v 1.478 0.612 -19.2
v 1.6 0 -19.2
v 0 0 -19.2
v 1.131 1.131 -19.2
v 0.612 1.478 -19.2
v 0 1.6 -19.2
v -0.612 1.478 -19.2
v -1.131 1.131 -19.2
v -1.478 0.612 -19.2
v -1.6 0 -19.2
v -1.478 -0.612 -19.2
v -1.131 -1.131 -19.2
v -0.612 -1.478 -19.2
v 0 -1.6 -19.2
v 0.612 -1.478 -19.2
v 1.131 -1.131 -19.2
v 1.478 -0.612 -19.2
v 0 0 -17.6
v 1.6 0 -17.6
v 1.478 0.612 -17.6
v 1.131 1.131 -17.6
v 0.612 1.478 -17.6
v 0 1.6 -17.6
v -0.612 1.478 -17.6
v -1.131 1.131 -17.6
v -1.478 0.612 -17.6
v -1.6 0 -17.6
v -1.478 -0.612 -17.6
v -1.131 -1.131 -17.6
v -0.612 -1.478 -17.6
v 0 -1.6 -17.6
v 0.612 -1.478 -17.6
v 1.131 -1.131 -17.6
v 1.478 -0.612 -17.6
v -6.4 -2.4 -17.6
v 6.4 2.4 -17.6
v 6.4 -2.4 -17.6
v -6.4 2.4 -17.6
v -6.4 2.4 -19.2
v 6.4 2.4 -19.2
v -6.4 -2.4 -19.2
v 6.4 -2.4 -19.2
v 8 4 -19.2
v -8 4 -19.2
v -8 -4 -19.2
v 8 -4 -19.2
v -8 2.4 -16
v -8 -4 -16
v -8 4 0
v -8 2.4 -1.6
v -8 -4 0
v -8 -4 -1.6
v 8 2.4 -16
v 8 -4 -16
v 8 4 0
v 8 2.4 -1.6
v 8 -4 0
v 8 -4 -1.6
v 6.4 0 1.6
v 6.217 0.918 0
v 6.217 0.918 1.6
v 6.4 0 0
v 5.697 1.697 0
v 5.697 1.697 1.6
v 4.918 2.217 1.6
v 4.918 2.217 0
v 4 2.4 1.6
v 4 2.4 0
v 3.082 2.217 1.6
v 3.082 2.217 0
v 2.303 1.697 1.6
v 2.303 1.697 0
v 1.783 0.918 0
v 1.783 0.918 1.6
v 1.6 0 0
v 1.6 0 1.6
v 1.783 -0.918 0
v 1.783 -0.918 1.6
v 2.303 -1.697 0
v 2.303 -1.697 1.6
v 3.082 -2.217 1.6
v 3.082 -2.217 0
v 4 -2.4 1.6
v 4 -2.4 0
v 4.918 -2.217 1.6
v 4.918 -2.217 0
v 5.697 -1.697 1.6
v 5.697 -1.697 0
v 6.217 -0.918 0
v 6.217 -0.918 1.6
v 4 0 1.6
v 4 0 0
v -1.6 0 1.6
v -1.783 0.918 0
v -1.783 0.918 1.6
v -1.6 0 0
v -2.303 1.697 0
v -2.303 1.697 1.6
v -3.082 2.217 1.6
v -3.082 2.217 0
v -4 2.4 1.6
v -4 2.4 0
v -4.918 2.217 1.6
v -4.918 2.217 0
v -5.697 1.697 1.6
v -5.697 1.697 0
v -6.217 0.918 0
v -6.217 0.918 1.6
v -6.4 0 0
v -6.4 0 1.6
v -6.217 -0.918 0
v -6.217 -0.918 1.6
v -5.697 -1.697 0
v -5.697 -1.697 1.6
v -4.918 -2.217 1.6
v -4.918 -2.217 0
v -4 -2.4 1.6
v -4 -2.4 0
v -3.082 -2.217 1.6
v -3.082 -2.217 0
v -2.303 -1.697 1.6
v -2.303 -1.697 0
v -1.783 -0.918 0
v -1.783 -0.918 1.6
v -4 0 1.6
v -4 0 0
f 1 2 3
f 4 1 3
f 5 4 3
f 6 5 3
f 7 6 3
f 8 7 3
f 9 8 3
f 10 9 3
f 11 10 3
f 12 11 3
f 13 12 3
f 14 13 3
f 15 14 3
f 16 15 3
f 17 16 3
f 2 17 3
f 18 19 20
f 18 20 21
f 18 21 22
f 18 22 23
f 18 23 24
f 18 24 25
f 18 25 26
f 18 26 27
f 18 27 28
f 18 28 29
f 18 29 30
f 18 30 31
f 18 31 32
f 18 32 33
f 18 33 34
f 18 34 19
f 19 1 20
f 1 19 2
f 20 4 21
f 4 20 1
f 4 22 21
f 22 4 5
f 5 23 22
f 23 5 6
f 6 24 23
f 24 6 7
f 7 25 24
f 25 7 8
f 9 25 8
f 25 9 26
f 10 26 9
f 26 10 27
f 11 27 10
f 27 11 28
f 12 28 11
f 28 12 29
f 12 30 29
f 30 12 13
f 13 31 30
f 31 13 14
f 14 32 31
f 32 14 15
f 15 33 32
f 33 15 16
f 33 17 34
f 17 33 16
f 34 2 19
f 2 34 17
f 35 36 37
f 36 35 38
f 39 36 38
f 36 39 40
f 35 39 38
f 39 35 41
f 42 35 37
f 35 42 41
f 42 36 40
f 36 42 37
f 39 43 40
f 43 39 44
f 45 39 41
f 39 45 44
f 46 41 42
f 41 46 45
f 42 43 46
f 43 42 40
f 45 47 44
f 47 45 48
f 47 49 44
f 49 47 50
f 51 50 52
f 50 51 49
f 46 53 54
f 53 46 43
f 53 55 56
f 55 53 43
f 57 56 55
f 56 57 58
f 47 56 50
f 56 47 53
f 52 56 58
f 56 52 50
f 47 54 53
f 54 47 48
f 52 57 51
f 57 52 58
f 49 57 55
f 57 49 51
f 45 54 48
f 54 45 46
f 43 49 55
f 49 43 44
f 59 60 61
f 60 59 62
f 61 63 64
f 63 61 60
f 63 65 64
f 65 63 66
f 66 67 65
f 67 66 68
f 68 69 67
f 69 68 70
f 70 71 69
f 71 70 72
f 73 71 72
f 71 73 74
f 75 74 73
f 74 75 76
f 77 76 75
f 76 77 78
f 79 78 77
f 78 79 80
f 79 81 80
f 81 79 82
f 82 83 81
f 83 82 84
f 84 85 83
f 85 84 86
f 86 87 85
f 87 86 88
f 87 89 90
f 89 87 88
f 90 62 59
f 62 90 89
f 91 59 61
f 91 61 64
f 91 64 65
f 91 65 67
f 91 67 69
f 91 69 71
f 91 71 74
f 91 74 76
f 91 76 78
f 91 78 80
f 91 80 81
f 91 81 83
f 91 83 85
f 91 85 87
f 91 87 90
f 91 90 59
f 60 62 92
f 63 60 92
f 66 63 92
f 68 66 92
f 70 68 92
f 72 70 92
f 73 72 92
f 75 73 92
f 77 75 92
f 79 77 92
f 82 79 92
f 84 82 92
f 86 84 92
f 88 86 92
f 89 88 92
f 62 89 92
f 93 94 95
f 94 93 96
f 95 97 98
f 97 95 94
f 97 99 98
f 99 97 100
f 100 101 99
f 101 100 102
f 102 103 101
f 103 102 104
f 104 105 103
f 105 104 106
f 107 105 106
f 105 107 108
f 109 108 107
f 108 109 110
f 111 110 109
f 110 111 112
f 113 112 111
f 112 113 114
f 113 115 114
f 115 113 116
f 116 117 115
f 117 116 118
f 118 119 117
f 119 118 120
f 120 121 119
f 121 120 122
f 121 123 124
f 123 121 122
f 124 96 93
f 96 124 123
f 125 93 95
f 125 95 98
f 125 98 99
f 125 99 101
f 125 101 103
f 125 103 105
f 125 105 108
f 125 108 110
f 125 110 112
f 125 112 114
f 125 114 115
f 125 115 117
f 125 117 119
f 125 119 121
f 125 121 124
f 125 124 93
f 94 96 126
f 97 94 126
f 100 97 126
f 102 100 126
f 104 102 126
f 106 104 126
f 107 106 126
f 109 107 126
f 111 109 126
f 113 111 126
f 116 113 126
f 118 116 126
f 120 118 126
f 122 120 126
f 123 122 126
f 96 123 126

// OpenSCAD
// file: ../p/4-4edge.scad
use <../lib.scad>
function ldraw_lib__4_4edge() = [
// 0 Circle 1.0
// 0 Name: 4-4edge.dat
// 0 Author: James Jessiman
// 0 !LDRAW_ORG Primitive UPDATE 2017-01
// 0 !LICENSE Licensed under CC BY 2.0 and CC BY 4.0 : see CAreadme.txt
// 
// 0 BFC CERTIFY CCW
  [0,"BFC","CERTIFY"],
  [0,"BFC","CCW"],
// 
// 0 !HISTORY 1998-12-15 [PTadmin] Official Update 1998-10
// 0 !HISTORY 2005-12-28 [PTadmin] Official Update 2005-01
// 0 !HISTORY 2007-06-24 [PTadmin] Header formatted for Contributor Agreement
// 0 !HISTORY 2008-07-01 [PTadmin] Official Update 2008-01
// 0 !HISTORY 2017-01-15 [Steffen] BFCed
// 0 !HISTORY 2017-12-30 [PTadmin] Official Update 2017-01
// 
// 
// 2 24 1 0 0 0.9239 0 0.3827
  [2,24,1,0,0,0.9239,0,0.3827],
// 2 24 0.9239 0 0.3827 0.7071 0 0.7071
  [2,24,0.9239,0,0.3827,0.7071,0,0.7071],
// 2 24 0.7071 0 0.7071 0.3827 0 0.9239
  [2,24,0.7071,0,0.7071,0.3827,0,0.9239],
// 2 24 0.3827 0 0.9239 0 0 1
  [2,24,0.3827,0,0.9239,0,0,1],
// 2 24 0 0 1 -0.3827 0 0.9239
  [2,24,0,0,1,-0.3827,0,0.9239],
// 2 24 -0.3827 0 0.9239 -0.7071 0 0.7071
  [2,24,-0.3827,0,0.9239,-0.7071,0,0.7071],
// 2 24 -0.7071 0 0.7071 -0.9239 0 0.3827
  [2,24,-0.7071,0,0.7071,-0.9239,0,0.3827],
// 2 24 -0.9239 0 0.3827 -1 0 -0
  [2,24,-0.9239,0,0.3827,-1,0,-0],
// 2 24 -1 0 -0 -0.9239 0 -0.3827
  [2,24,-1,0,-0,-0.9239,0,-0.3827],
// 2 24 -0.9239 0 -0.3827 -0.7071 0 -0.7071
  [2,24,-0.9239,0,-0.3827,-0.7071,0,-0.7071],
// 2 24 -0.7071 0 -0.7071 -0.3827 0 -0.9239
  [2,24,-0.7071,0,-0.7071,-0.3827,0,-0.9239],
// 2 24 -0.3827 0 -0.9239 0 0 -1
  [2,24,-0.3827,0,-0.9239,0,0,-1],
// 2 24 0 0 -1 0.3827 0 -0.9239
  [2,24,0,0,-1,0.3827,0,-0.9239],
// 2 24 0.3827 0 -0.9239 0.7071 0 -0.7071
  [2,24,0.3827,0,-0.9239,0.7071,0,-0.7071],
// 2 24 0.7071 0 -0.7071 0.9239 0 -0.3827
  [2,24,0.7071,0,-0.7071,0.9239,0,-0.3827],
// 2 24 0.9239 0 -0.3827 1 0 0
  [2,24,0.9239,0,-0.3827,1,0,0],
];
module ldraw_lib__4_4edge(step=0, col=false, unit=2/5, alt=false, line=0.2, solid=!$preview)
    makepoly(ldraw_lib__4_4edge(), step=step, col=col, unit=unit, alt=alt, line=line, solid=solid);
ldraw_lib__4_4edge(line=0.2);
// file: ../p/4-4disc.scad
use <../lib.scad>
function ldraw_lib__4_4disc() = [
// 0 Disc 1.0
// 0 Name: 4-4disc.dat
// 0 Author: James Jessiman
// 0 !LDRAW_ORG Primitive UPDATE 2002-02
// 0 !LICENSE Licensed under CC BY 2.0 and CC BY 4.0 : see CAreadme.txt
// 
// 0 BFC CERTIFY CCW
  [0,"BFC","CERTIFY"],
  [0,"BFC","CCW"],
// 
// 0 !HISTORY 1998-12-15 [PTadmin] Official Update 1998-10
// 0 !HISTORY 2002-03-23 [sbliss] Added BFC statement
// 0 !HISTORY 2002-04-25 [PTadmin] Official Update 2002-02
// 0 !HISTORY 2007-06-24 [PTadmin] Header formatted for Contributor Agreement
// 0 !HISTORY 2008-07-01 [PTadmin] Official Update 2008-01
// 
// 
// 3 16 0 0 0 1 0 0 0.9239 0 0.3827
  [3,16,0,0,0,1,0,0,0.9239,0,0.3827],
// 3 16 0 0 0 0.9239 0 0.3827 0.7071 0 0.7071
  [3,16,0,0,0,0.9239,0,0.3827,0.7071,0,0.7071],
// 3 16 0 0 0 0.7071 0 0.7071 0.3827 0 0.9239
  [3,16,0,0,0,0.7071,0,0.7071,0.3827,0,0.9239],
// 3 16 0 0 0 0.3827 0 0.9239 0 0 1
  [3,16,0,0,0,0.3827,0,0.9239,0,0,1],
// 3 16 0 0 0 0 0 1 -0.3827 0 0.9239
  [3,16,0,0,0,0,0,1,-0.3827,0,0.9239],
// 3 16 0 0 0 -0.3827 0 0.9239 -0.7071 0 0.7071
  [3,16,0,0,0,-0.3827,0,0.9239,-0.7071,0,0.7071],
// 3 16 0 0 0 -0.7071 0 0.7071 -0.9239 0 0.3827
  [3,16,0,0,0,-0.7071,0,0.7071,-0.9239,0,0.3827],
// 3 16 0 0 0 -0.9239 0 0.3827 -1 0 -0
  [3,16,0,0,0,-0.9239,0,0.3827,-1,0,-0],
// 3 16 0 0 0 -1 0 -0 -0.9239 0 -0.3827
  [3,16,0,0,0,-1,0,-0,-0.9239,0,-0.3827],
// 3 16 0 0 0 -0.9239 0 -0.3827 -0.7071 0 -0.7071
  [3,16,0,0,0,-0.9239,0,-0.3827,-0.7071,0,-0.7071],
// 3 16 0 0 0 -0.7071 0 -0.7071 -0.3827 0 -0.9239
  [3,16,0,0,0,-0.7071,0,-0.7071,-0.3827,0,-0.9239],
// 3 16 0 0 0 -0.3827 0 -0.9239 0 0 -1
  [3,16,0,0,0,-0.3827,0,-0.9239,0,0,-1],
// 3 16 0 0 0 0 0 -1 0.3827 0 -0.9239
  [3,16,0,0,0,0,0,-1,0.3827,0,-0.9239],
// 3 16 0 0 0 0.3827 0 -0.9239 0.7071 0 -0.7071
  [3,16,0,0,0,0.3827,0,-0.9239,0.7071,0,-0.7071],
// 3 16 0 0 0 0.7071 0 -0.7071 0.9239 0 -0.3827
  [3,16,0,0,0,0.7071,0,-0.7071,0.9239,0,-0.3827],
// 3 16 0 0 0 0.9239 0 -0.3827 1 0 0
  [3,16,0,0,0,0.9239,0,-0.3827,1,0,0],
// 0
];
module ldraw_lib__4_4disc(step=0, col=false, unit=2/5, alt=false, line=0.2, solid=!$preview)
    makepoly(ldraw_lib__4_4disc(), step=step, col=col, unit=unit, alt=alt, line=line, solid=solid);
ldraw_lib__4_4disc(line=0.2);
// file: ../p/4-4cyli.scad
use <../lib.scad>
$fa=1; $fs=0.2;
function ldraw_lib__4_4cyli(realsolid=false) = [
// 0 Cylinder 1.0
// 0 Name: 4-4cyli.dat
// 0 Author: James Jessiman
// 0 !LDRAW_ORG Primitive UPDATE 2005-01
// 0 !LICENSE Licensed under CC BY 2.0 and CC BY 4.0 : see CAreadme.txt
// 
// 0 BFC CERTIFY CCW
  [0,"BFC","CERTIFY"],
  [0,"BFC","CCW"],
// 
// 0 !HISTORY 1998-12-15 [PTadmin] Official Update 1998-10
// 0 !HISTORY 2002-03-23 [sbliss] Added BFC statement; merged headers from files in distributions LDraw 0.27 and Complete.
// 0 !HISTORY 2002-04-25 [PTadmin] Official Update 2002-02
// 0 !HISTORY 2004-12-14 [guyvivan] BFC CCW
// 0 !HISTORY 2005-12-28 [PTadmin] Official Update 2005-01
// 0 !HISTORY 2007-06-24 [PTadmin] Header formatted for Contributor Agreement
// 0 !HISTORY 2008-07-01 [PTadmin] Official Update 2008-01
// 
// 
// 4 16 1 1 0 0.9239 1 0.3827 0.9239 0 0.3827 1 0 0
  [4,16,1,1,0,0.9239,1,0.3827,0.9239,0,0.3827,1,0,0],
// 5 24 1 0 0 1 1 0 0.9239 0 0.3827 0.9239 0 -0.3827
  [5,24,1,0,0,1,1,0,0.9239,0,0.3827,0.9239,0,-0.3827],
// 4 16 0.9239 1 0.3827 0.7071 1 0.7071 0.7071 0 0.7071 0.9239 0 0.3827
  [4,16,0.9239,1,0.3827,0.7071,1,0.7071,0.7071,0,0.7071,0.9239,0,0.3827],
// 5 24 0.9239 0 0.3827 0.9239 1 0.3827 0.7071 0 0.7071 1 0 0
  [5,24,0.9239,0,0.3827,0.9239,1,0.3827,0.7071,0,0.7071,1,0,0],
// 4 16 0.7071 1 0.7071 0.3827 1 0.9239 0.3827 0 0.9239 0.7071 0 0.7071
  [4,16,0.7071,1,0.7071,0.3827,1,0.9239,0.3827,0,0.9239,0.7071,0,0.7071],
// 5 24 0.7071 0 0.7071 0.7071 1 0.7071 0.3827 0 0.9239 0.9239 0 0.3827
  [5,24,0.7071,0,0.7071,0.7071,1,0.7071,0.3827,0,0.9239,0.9239,0,0.3827],
// 4 16 0.3827 1 0.9239 0 1 1 0 0 1 0.3827 0 0.9239
  [4,16,0.3827,1,0.9239,0,1,1,0,0,1,0.3827,0,0.9239],
// 5 24 0.3827 0 0.9239 0.3827 1 0.9239 0 0 1 0.7071 0 0.7071
  [5,24,0.3827,0,0.9239,0.3827,1,0.9239,0,0,1,0.7071,0,0.7071],
// 4 16 0 1 1 -0.3827 1 0.9239 -0.3827 0 0.9239 0 0 1
  [4,16,0,1,1,-0.3827,1,0.9239,-0.3827,0,0.9239,0,0,1],
// 5 24 0 0 1 0 1 1 -0.3827 0 0.9239 0.3827 0 0.9239
  [5,24,0,0,1,0,1,1,-0.3827,0,0.9239,0.3827,0,0.9239],
// 4 16 -0.3827 1 0.9239 -0.7071 1 0.7071 -0.7071 0 0.7071 -0.3827 0 0.9239
  [4,16,-0.3827,1,0.9239,-0.7071,1,0.7071,-0.7071,0,0.7071,-0.3827,0,0.9239],
// 5 24 -0.3827 0 0.9239 -0.3827 1 0.9239 -0.7071 0 0.7071 0 0 1
  [5,24,-0.3827,0,0.9239,-0.3827,1,0.9239,-0.7071,0,0.7071,0,0,1],
// 4 16 -0.7071 1 0.7071 -0.9239 1 0.3827 -0.9239 0 0.3827 -0.7071 0 0.7071
  [4,16,-0.7071,1,0.7071,-0.9239,1,0.3827,-0.9239,0,0.3827,-0.7071,0,0.7071],
// 5 24 -0.7071 0 0.7071 -0.7071 1 0.7071 -0.9239 0 0.3827 -0.3827 0 0.9239
  [5,24,-0.7071,0,0.7071,-0.7071,1,0.7071,-0.9239,0,0.3827,-0.3827,0,0.9239],
// 4 16 -0.9239 1 0.3827 -1 1 0 -1 0 0 -0.9239 0 0.3827
  [4,16,-0.9239,1,0.3827,-1,1,0,-1,0,0,-0.9239,0,0.3827],
// 5 24 -0.9239 0 0.3827 -0.9239 1 0.3827 -1 0 0 -0.7071 0 0.7071
  [5,24,-0.9239,0,0.3827,-0.9239,1,0.3827,-1,0,0,-0.7071,0,0.7071],
// 4 16 -1 1 0 -0.9239 1 -0.3827 -0.9239 0 -0.3827 -1 0 0
  [4,16,-1,1,0,-0.9239,1,-0.3827,-0.9239,0,-0.3827,-1,0,0],
// 5 24 -1 0 0 -1 1 0 -0.9239 0 -0.3827 -0.9239 0 0.3827
  [5,24,-1,0,0,-1,1,0,-0.9239,0,-0.3827,-0.9239,0,0.3827],
// 4 16 -0.9239 1 -0.3827 -0.7071 1 -0.7071 -0.7071 0 -0.7071 -0.9239 0 -0.3827
  [4,16,-0.9239,1,-0.3827,-0.7071,1,-0.7071,-0.7071,0,-0.7071,-0.9239,0,-0.3827],
// 5 24 -0.9239 0 -0.3827 -0.9239 1 -0.3827 -0.7071 0 -0.7071 -1 0 0
  [5,24,-0.9239,0,-0.3827,-0.9239,1,-0.3827,-0.7071,0,-0.7071,-1,0,0],
// 4 16 -0.7071 1 -0.7071 -0.3827 1 -0.9239 -0.3827 0 -0.9239 -0.7071 0 -0.7071
  [4,16,-0.7071,1,-0.7071,-0.3827,1,-0.9239,-0.3827,0,-0.9239,-0.7071,0,-0.7071],
// 5 24 -0.7071 0 -0.7071 -0.7071 1 -0.7071 -0.3827 0 -0.9239 -0.9239 0 -0.3827
  [5,24,-0.7071,0,-0.7071,-0.7071,1,-0.7071,-0.3827,0,-0.9239,-0.9239,0,-0.3827],
// 4 16 -0.3827 1 -0.9239 0 1 -1 0 0 -1 -0.3827 0 -0.9239
  [4,16,-0.3827,1,-0.9239,0,1,-1,0,0,-1,-0.3827,0,-0.9239],
// 5 24 -0.3827 0 -0.9239 -0.3827 1 -0.9239 0 0 -1 -0.7071 0 -0.7071
  [5,24,-0.3827,0,-0.9239,-0.3827,1,-0.9239,0,0,-1,-0.7071,0,-0.7071],
// 4 16 0 1 -1 0.3827 1 -0.9239 0.3827 0 -0.9239 0 0 -1
  [4,16,0,1,-1,0.3827,1,-0.9239,0.3827,0,-0.9239,0,0,-1],
// 5 24 0 0 -1 0 1 -1 0.3827 0 -0.9239 -0.3827 0 -0.9239
  [5,24,0,0,-1,0,1,-1,0.3827,0,-0.9239,-0.3827,0,-0.9239],
// 4 16 0.3827 1 -0.9239 0.7071 1 -0.7071 0.7071 0 -0.7071 0.3827 0 -0.9239
  [4,16,0.3827,1,-0.9239,0.7071,1,-0.7071,0.7071,0,-0.7071,0.3827,0,-0.9239],
// 5 24 0.3827 0 -0.9239 0.3827 1 -0.9239 0.7071 0 -0.7071 0 0 -1
  [5,24,0.3827,0,-0.9239,0.3827,1,-0.9239,0.7071,0,-0.7071,0,0,-1],
// 4 16 0.7071 1 -0.7071 0.9239 1 -0.3827 0.9239 0 -0.3827 0.7071 0 -0.7071
  [4,16,0.7071,1,-0.7071,0.9239,1,-0.3827,0.9239,0,-0.3827,0.7071,0,-0.7071],
// 5 24 0.7071 0 -0.7071 0.7071 1 -0.7071 0.9239 0 -0.3827 0.3827 0 -0.9239
  [5,24,0.7071,0,-0.7071,0.7071,1,-0.7071,0.9239,0,-0.3827,0.3827,0,-0.9239],
// 4 16 0.9239 1 -0.3827 1 1 0 1 0 0 0.9239 0 -0.3827
  [4,16,0.9239,1,-0.3827,1,1,0,1,0,0,0.9239,0,-0.3827],
// 5 24 0.9239 0 -0.3827 0.9239 1 -0.3827 1 0 0 0.7071 0 -0.7071
  [5,24,0.9239,0,-0.3827,0.9239,1,-0.3827,1,0,0,0.7071,0,-0.7071],
// 0
];
module ldraw_lib__4_4cyli(step=0, col=false, unit=2/5, alt=false, line=0.2, solid=!$preview)
    makepoly(ldraw_lib__4_4cyli(solid), step=step, col=col, unit=unit, alt=alt, line=line, solid=solid);
ldraw_lib__4_4cyli(line=0.2);
// file: ../p/stud3.scad
use <../lib.scad>
use <4-4cyli.scad>
use <4-4disc.scad>
use <4-4edge.scad>
function ldraw_lib__stud3() = [
// 0 Stud Tube Solid
// 0 Name: stud3.dat
// 0 Author: James Jessiman
// 0 !LDRAW_ORG Primitive UPDATE 2012-01
// 0 !LICENSE Licensed under CC BY 4.0 : see CAreadme.txt
// 
// 0 BFC CERTIFY CCW
  [0,"BFC","CERTIFY"],
  [0,"BFC","CCW"],
// 
// 0 !HISTORY 2002-04-04 [sbliss] Modified for BFC compliance
// 0 !HISTORY 2002-04-25 [PTadmin] Official Update 2002-02
// 0 !HISTORY 2007-06-24 [PTadmin] Header formatted for Contributor Agreement
// 0 !HISTORY 2008-07-01 [PTadmin] Official Update 2008-01
// 0 !HISTORY 2012-02-16 [Philo] Changed to CCW
// 0 !HISTORY 2012-03-30 [PTadmin] Official Update 2012-01
// 
// 
// 1 16 0 -4 0 4 0 0 0 1 0 0 0 4 4-4edge.dat
  [1,16,0,-4,0,4,0,0,0,1,0,0,0,4, ldraw_lib__4_4edge()],
// 1 16 0 0 0 4 0 0 0 1 0 0 0 4 4-4edge.dat
  [1,16,0,0,0,4,0,0,0,1,0,0,0,4, ldraw_lib__4_4edge()],
// 1 16 0 -4 0 4 0 0 0 1 0 0 0 4 4-4disc.dat
  [1,16,0,-4,0,4,0,0,0,1,0,0,0,4, ldraw_lib__4_4disc()],
  [-1,16,0,0,0,4,0,0,0,-1,0,0,0,4, ldraw_lib__4_4disc()],
// 1 16 0 -4 0 4 0 0 0 4 0 0 0 4 4-4cyli.dat
  [1,16,0,-4,0,4,0,0,0,4,0,0,0,4, ldraw_lib__4_4cyli()],
];
module ldraw_lib__stud3(step=0, col=false, unit=2/5, alt=false, line=0.2, solid=!$preview)
    makepoly(ldraw_lib__stud3(), step=step, col=col, unit=unit, alt=alt, line=line, solid=solid);
ldraw_lib__stud3(line=0.2);
// file: ../p/rect3.scad
use <../lib.scad>
function ldraw_lib__rect3() = [
// 0 Rectangle with 3 Edges
// 0 Name: rect3.dat
// 0 Author: Mark Kennedy [mkennedy]
// 0 !LDRAW_ORG Primitive UPDATE 2010-01
// 0 !LICENSE Licensed under CC BY 4.0 : see CAreadme.txt
// 
// 0 BFC CERTIFY CCW
  [0,"BFC","CERTIFY"],
  [0,"BFC","CCW"],
// 
// 0 !HISTORY 2003-08-01 [PTadmin] Official Update 2003-02
// 0 !HISTORY 2007-06-24 [PTadmin] Header formatted for Contributor Agreement
// 0 !HISTORY 2008-07-01 [PTadmin] Official Update 2008-01
// 0 !HISTORY 2010-01-17 [mikeheide] Change winding to CCW
// 0 !HISTORY 2010-04-05 [PTadmin] Official Update 2010-01
// 
// 
// 2 24 1 0 1 -1 0 1
  [2,24,1,0,1,-1,0,1],
// 2 24 1 0 1 1 0 -1
  [2,24,1,0,1,1,0,-1],
// 2 24 -1 0 1 -1 0 -1
  [2,24,-1,0,1,-1,0,-1],
// 4 16 -1 0 1 -1 0 -1 1 0 -1 1 0 1
  [4,16,-1,0,1,-1,0,-1,1,0,-1,1,0,1],
// 0 //
];
module ldraw_lib__rect3(step=0, col=false, unit=2/5, alt=false, line=0.2, solid=!$preview)
    makepoly(ldraw_lib__rect3(), step=step, col=col, unit=unit, alt=alt, line=line, solid=solid);
ldraw_lib__rect3(line=0.2);
// file: ../p/box5.scad
use <../lib.scad>
function ldraw_lib__box5() = [
// 0 Box with 5 Faces and All Edges
// 0 Name: box5.dat
// 0 Author: James Jessiman
// 0 !LDRAW_ORG Primitive UPDATE 2012-01
// 0 !LICENSE Licensed under CC BY 2.0 and CC BY 4.0 : see CAreadme.txt
// 
// 0 BFC CERTIFY CCW
  [0,"BFC","CERTIFY"],
  [0,"BFC","CCW"],
// 
// 0 !HISTORY 2002-04-03 [sbliss] Modified for BFC compliance
// 0 !HISTORY 2002-04-25 [PTadmin] Official Update 2002-02
// 0 !HISTORY 2007-06-24 [PTadmin] Header formatted for Contributor Agreement
// 0 !HISTORY 2008-07-01 [PTadmin] Official Update 2008-01
// 0 !HISTORY 2012-02-16 [Philo] Changed to CCW
// 0 !HISTORY 2012-03-30 [PTadmin] Official Update 2012-01
// 
// 
// 2 24 1 1 1 -1 1 1
  [2,24,1,1,1,-1,1,1],
// 2 24 -1 1 1 -1 1 -1
  [2,24,-1,1,1,-1,1,-1],
// 2 24 -1 1 -1 1 1 -1
  [2,24,-1,1,-1,1,1,-1],
// 2 24 1 1 -1 1 1 1
  [2,24,1,1,-1,1,1,1],
// 2 24 1 0 1 -1 0 1
  [2,24,1,0,1,-1,0,1],
// 2 24 -1 0 1 -1 0 -1
  [2,24,-1,0,1,-1,0,-1],
// 2 24 -1 0 -1 1 0 -1
  [2,24,-1,0,-1,1,0,-1],
// 2 24 1 0 -1 1 0 1
  [2,24,1,0,-1,1,0,1],
// 2 24 1 0 1 1 1 1
  [2,24,1,0,1,1,1,1],
// 2 24 -1 0 1 -1 1 1
  [2,24,-1,0,1,-1,1,1],
// 2 24 1 0 -1 1 1 -1
  [2,24,1,0,-1,1,1,-1],
// 2 24 -1 0 -1 -1 1 -1
  [2,24,-1,0,-1,-1,1,-1],
// 4 16 -1 1 1 1 1 1 1 1 -1 -1 1 -1
  [4,16,-1,1,1,1,1,1,1,1,-1,-1,1,-1],
// 4 16 -1 1 1 -1 0 1 1 0 1 1 1 1
  [4,16,-1,1,1,-1,0,1,1,0,1,1,1,1],
// 4 16 -1 1 -1 -1 0 -1 -1 0 1 -1 1 1
  [4,16,-1,1,-1,-1,0,-1,-1,0,1,-1,1,1],
// 4 16 1 1 -1 1 0 -1 -1 0 -1 -1 1 -1
  [4,16,1,1,-1,1,0,-1,-1,0,-1,-1,1,-1],
// 4 16 1 1 1 1 0 1 1 0 -1 1 1 -1
  [4,16,1,1,1,1,0,1,1,0,-1,1,1,-1],
];
makepoly(ldraw_lib__box5(), line=0.2);
// file: ../p/box3u2p.scad
use <../lib.scad>
function ldraw_lib__box3u2p() = [
// 0 Box with 3 Faces without 2 Parallel Edges
// 0 Name: box3u2p.dat
// 0 Author: Niels Karsdorp [nielsk]
// 0 !LDRAW_ORG Primitive UPDATE 2012-01
// 0 !LICENSE Licensed under CC BY 2.0 and CC BY 4.0 : see CAreadme.txt
// 
// 0 BFC CERTIFY CCW
  [0,"BFC","CERTIFY"],
  [0,"BFC","CCW"],
// 
// 0 !HISTORY 2003-03-12 [PTadmin] Official Update 2003-01
// 0 !HISTORY 2007-06-24 [PTadmin] Header formatted for Contributor Agreement
// 0 !HISTORY 2008-07-01 [PTadmin] Official Update 2008-01
// 0 !HISTORY 2012-02-16 [Philo] Changed to CCW
// 0 !HISTORY 2012-03-30 [PTadmin] Official Update 2012-01
// 
// 
// 2 24 1 1 1 -1 1 1
  [2,24,1,1,1,-1,1,1],
// 2 24 -1 1 -1 1 1 -1
  [2,24,-1,1,-1,1,1,-1],
// 2 24 1 0 1 -1 0 1
  [2,24,1,0,1,-1,0,1],
// 2 24 -1 0 -1 1 0 -1
  [2,24,-1,0,-1,1,0,-1],
// 2 24 1 1 1 1 1 -1
  [2,24,1,1,1,1,1,-1],
// 2 24 -1 1 1 -1 1 -1
  [2,24,-1,1,1,-1,1,-1],
// 2 24 1 1 1 1 0 1
  [2,24,1,1,1,1,0,1],
// 2 24 1 1 -1 1 0 -1
  [2,24,1,1,-1,1,0,-1],
// 2 24 -1 1 1 -1 0 1
  [2,24,-1,1,1,-1,0,1],
// 2 24 -1 1 -1 -1 0 -1
  [2,24,-1,1,-1,-1,0,-1],
// 4 16 -1 1 -1 -1 1 1 1 1 1 1 1 -1
  [4,16,-1,1,-1,-1,1,1,1,1,1,1,1,-1],
// 4 16 -1 1 1 -1 0 1 1 0 1 1 1 1
  [4,16,-1,1,1,-1,0,1,1,0,1,1,1,1],
// 4 16 1 1 -1 1 0 -1 -1 0 -1 -1 1 -1
  [4,16,1,1,-1,1,0,-1,-1,0,-1,-1,1,-1],
];
module ldraw_lib__box3u2p(step=0, col=false, unit=2/5, alt=false, line=0.2, solid=!$preview)
    makepoly(ldraw_lib__box3u2p(), step=step, col=col, unit=unit, alt=alt, line=line, solid=solid);
ldraw_lib__box3u2p(line=0.2);
// file: ../p/box2-5.scad
use <../lib.scad>
$fa=1; $fs=0.2;
function ldraw_lib__box2_5(realsolid=false) = [
// 0 Box with 2 Faces without 5 Edges
// 0 Name: box2-5.dat
// 0 Author: Steffen [Steffen]
// 0 !LDRAW_ORG Primitive UPDATE 2003-03
// 0 !LICENSE Licensed under CC BY 2.0 and CC BY 4.0 : see CAreadme.txt
// 
// 0 BFC CERTIFY CCW
  [0,"BFC","CERTIFY"],
  [0,"BFC","CCW"],
// 
// 0 !HISTORY 2003-12-19 [PTadmin] Official Update 2003-03
// 0 !HISTORY 2007-06-24 [PTadmin] Header formatted for Contributor Agreement
// 0 !HISTORY 2008-07-01 [PTadmin] Official Update 2008-01
// 
// 
// 2 24 1 1 1 -1 1 1
  [2,24,1,1,1,-1,1,1],
// 2 24 1 1 -1 -1 1 -1
  [2,24,1,1,-1,-1,1,-1],
// 2 24 1 -1 1 -1 -1 1
  [2,24,1,-1,1,-1,-1,1],
// 2 24 -1 -1 1 -1 1 1
  [2,24,-1,-1,1,-1,1,1],
// 2 24 1 -1 1 1 1 1
  [2,24,1,-1,1,1,1,1],
// 2 24 -1 1 -1 -1 1 1
  [2,24,-1,1,-1,-1,1,1],
// 2 24 1 1 -1 1 1 1
  [2,24,1,1,-1,1,1,1],
// 4 16 1 1 1 1 1 -1 -1 1 -1 -1 1 1
  [4,16,1,1,1,1,1,-1,-1,1,-1,-1,1,1],
// 4 16 1 1 1 -1 1 1 -1 -1 1 1 -1 1
  [4,16,1,1,1,-1,1,1,-1,-1,1,1,-1,1],
// 0
];
module ldraw_lib__box2_5(step=0, col=false, unit=2/5, alt=false, line=0.2, solid=!$preview)
    makepoly(ldraw_lib__box2_5(solid), step=step, col=col, unit=unit, alt=alt, line=line, solid=solid);
ldraw_lib__box2_5(line=0.2);
// file: ../p/stud.scad
use <../lib.scad>
use <4-4cyli.scad>
use <4-4disc.scad>
use <4-4edge.scad>
function ldraw_lib__stud() = [
// 0 Stud
// 0 Name: stud.dat
// 0 Author: James Jessiman
// 0 !LDRAW_ORG Primitive UPDATE 2012-01
// 0 !LICENSE Licensed under CC BY 4.0 : see CAreadme.txt
// 
// 0 BFC CERTIFY CCW
  [0,"BFC","CERTIFY"],
  [0,"BFC","CCW"],
// 
// 0 !HISTORY 2002-04-04 [sbliss] Modified for BFC compliance
// 0 !HISTORY 2002-04-25 [PTadmin] Official Update 2002-02
// 0 !HISTORY 2007-06-24 [PTadmin] Header formatted for Contributor Agreement
// 0 !HISTORY 2008-07-01 [PTadmin] Official Update 2008-01
// 0 !HISTORY 2012-02-16 [Philo] Changed to CCW
// 0 !HISTORY 2012-03-30 [PTadmin] Official Update 2012-01
// 
// 
// 1 16 0 0 0 6 0 0 0 1 0 0 0 6 4-4edge.dat
  [1,16,0,0,0,6,0,0,0,1,0,0,0,6, ldraw_lib__4_4edge()],
// 1 16 0 -4 0 6 0 0 0 1 0 0 0 6 4-4edge.dat
  [1,16,0,-4,0,6,0,0,0,1,0,0,0,6, ldraw_lib__4_4edge()],
// 1 16 0 0 0 6 0 0 0 -4 0 0 0 6 4-4cyli.dat
  [1,16,0,0,0,6,0,0,0,-4,0,0,0,6, ldraw_lib__4_4cyli()],
// 1 16 0 -4 0 6 0 0 0 1 0 0 0 6 4-4disc.dat
  [1,16,0,-4,0,6,0,0,0,1,0,0,0,6, ldraw_lib__4_4disc()],
  [-1,16,0,0,0,6,0,0,0,-1,0,0,0,6, ldraw_lib__4_4disc()],
];
module ldraw_lib__stud(step=0, col=false, unit=2/5, alt=false, line=0.2, solid=!$preview)
    makepoly(ldraw_lib__stud(), step=step, col=col, unit=unit, alt=alt, line=line, solid=solid);
ldraw_lib__stud(line=0.2);
// file: s/4864s01.scad
use <../../lib.scad>
use <../../p/box2-5.scad>
use <../../p/box3u2p.scad>
use <../../p/box5.scad>
use <../../p/rect3.scad>
use <../../p/stud3.scad>
function ldraw_lib__s__4864s01() = [
// 0 ~Panel  1 x  2 x  2 without Front Face and Studs
// 0 Name: s\4864s01.dat
// 0 Author: Mark Kennedy [mkennedy]
// 0 !LDRAW_ORG Subpart UPDATE 2004-03
// 0 !LICENSE Licensed under CC BY 4.0 : see CAreadme.txt
// 
// 0 BFC CERTIFY CCW
  [0,"BFC","CERTIFY"],
  [0,"BFC","CCW"],
// 
// 0 !HISTORY 2003-07-02 [Steffen] BFCed
// 0 !HISTORY 2004-04-22 [PTadmin] Official Update 2004-02
// 0 !HISTORY 2004-04-25 [cwdee] Restructured for solid/hollow studs
// 0 !HISTORY 2004-09-15 [PTadmin] Official Update 2004-03
// 0 !HISTORY 2007-09-10 [PTadmin] Header formatted for Contributor Agreement
// 0 !HISTORY 2008-07-01 [PTadmin] Official Update 2008-01
// 
// 
// 0 // Uncomment for decorated surface
// 0 // 4 16 -20 0 10 -20 48 10 20 48 10 20 0 10
// 0 // Uncomment for solid studs
// 0 // 1 16 10 0 0 1 0 0 0 1 0 0 0 1 stud.dat
// 0 // 1 16 -10 0 0 1 0 0 0 1 0 0 0 1 stud.dat
// 0 // Uncomment for hollow studs
// 0 // 1 16 10 0 0 1 0 0 0 1 0 0 0 1 stud2.dat
// 0 // 1 16 -10 0 0 1 0 0 0 1 0 0 0 1 stud2.dat
// 1 16 0 44 0 1 0 0 0 -1 0 0 0 1 stud3.dat
  [1,16,0,44,0,1,0,0,0,-1,0,0,0,1, ldraw_lib__stud3()],
// 0 BFC INVERTNEXT
  [0,"BFC","INVERTNEXT"],
// 1 16 0 48 0 16 0 0 0 -4 0 0 0 6 box5.dat
  [1,16,0,48,0,16,0,0,0,-4,0,0,0,6, ldraw_lib__box5()],
// 4 16 20 48 10 16 48 6 -16 48 6 -20 48 10
  [4,16,20,48,10,16,48,6,-16,48,6,-20,48,10],
// 4 16 -20 48 10 -16 48 6 -16 48 -6 -20 48 -10
  [4,16,-20,48,10,-16,48,6,-16,48,-6,-20,48,-10],
// 4 16 -20 48 -10 -16 48 -6 16 48 -6 20 48 -10
  [4,16,-20,48,-10,-16,48,-6,16,48,-6,20,48,-10],
// 4 16 20 48 -10 16 48 -6 16 48 6 20 48 10
  [4,16,20,48,-10,16,48,-6,16,48,6,20,48,10],
// 2 24 20 48 10 -20 48 10
  [2,24,20,48,10,-20,48,10],
// 2 24 -20 48 10 -20 48 -10
  [2,24,-20,48,10,-20,48,-10],
// 2 24 20 48 -10 20 48 10
  [2,24,20,48,-10,20,48,10],
// 2 24 20 0 10 20 48 10
  [2,24,20,0,10,20,48,10],
// 2 24 -20 0 10 -20 48 10
  [2,24,-20,0,10,-20,48,10],
// 4 16 -20 40 6 -20 48 10 -20 48 -10 -20 40 -10
  [4,16,-20,40,6,-20,48,10,-20,48,-10,-20,40,-10],
// 4 16 -20 48 10 -20 40 6 -20 4 6 -20 0 10
  [4,16,-20,48,10,-20,40,6,-20,4,6,-20,0,10],
// 4 16 -20 0 10 -20 4 6 -20 4 -10 -20 0 -10
  [4,16,-20,0,10,-20,4,6,-20,4,-10,-20,0,-10],
// 4 16 20 48 -10 20 48 10 20 40 6 20 40 -10
  [4,16,20,48,-10,20,48,10,20,40,6,20,40,-10],
// 4 16 20 4 6 20 40 6 20 48 10 20 0 10
  [4,16,20,4,6,20,40,6,20,48,10,20,0,10],
// 4 16 20 4 -10 20 4 6 20 0 10 20 0 -10
  [4,16,20,4,-10,20,4,6,20,0,10,20,0,-10],
// 0 BFC INVERTNEXT
  [0,"BFC","INVERTNEXT"],
// 1 16 0 22 -10 20 0 0 0 0 -18 0 16 0 box3u2p.dat
  [1,16,0,22,-10,20,0,0,0,0,-18,0,16,0, ldraw_lib__box3u2p()],
// 1 16 0 2 0 20 0 0 0 0 -2 0 -10 0 box2-5.dat
  [1,16,0,2,0,20,0,0,0,0,-2,0,-10,0, ldraw_lib__box2_5()],
// 1 16 0 44 -10 -20 0 0 0 0 4 0 1 0 rect3.dat
  [1,16,0,44,-10,-20,0,0,0,0,4,0,1,0, ldraw_lib__rect3()],
// 0
];
module ldraw_lib__s__4864s01(step=0, col=false, unit=2/5, alt=false, line=0.2, solid=!$preview)
    makepoly(ldraw_lib__s__4864s01(), step=step, col=col, unit=unit, alt=alt, line=line, solid=solid);
ldraw_lib__s__4864s01(line=0.2);
// main file
use <../lib.scad>
use <s/4864s01.scad>
use <../p/stud.scad>
function ldraw_lib__4864a() = [
// 0 Panel  1 x  2 x  2 with Solid Studs
// 0 Name: 4864a.dat
// 0 Author: James Jessiman
// 0 !LDRAW_ORG Part UPDATE 2026-08
// 0 !LICENSE Licensed under CC BY 4.0 : see CAreadme.txt
// 
// 0 BFC CERTIFY CCW
  [0,"BFC","CERTIFY"],
  [0,"BFC","CCW"],
// 
// 0 !CATEGORY Panel
// 
// 0 !HISTORY 2004-04-25 [cwdee] Created solid stud version
// 0 !HISTORY 2004-09-15 [PTadmin] Official Update 2004-03
// 0 !HISTORY 2007-07-09 [PTadmin] Header formatted for Contributor Agreement
// 0 !HISTORY 2008-07-01 [PTadmin] Official Update 2008-01
// 0 !HISTORY 2025-09-27 [OrionP] Changed winding to CCW
// 0 !HISTORY 2025-09-29 [OrionP] Official Update 2025-09
// 0 !HISTORY 2026-08-31 [OrionP] Minor header edits
// 0 !HISTORY 2026-08-31 [OrionP] Official Update 2026-08
// 
// 1 16 0 0 0 1 0 0 0 1 0 0 0 1 s\4864s01.dat
  [1,16,0,0,0,1,0,0,0,1,0,0,0,1, ldraw_lib__s__4864s01()],
// 
// 4 16 20 0 10 20 48 10 -20 48 10 -20 0 10
  [4,16,20,0,10,20,48,10,-20,48,10,-20,0,10],
// 1 16 10 0 0 1 0 0 0 1 0 0 0 1 stud.dat
  [1,16,10,0,0,1,0,0,0,1,0,0,0,1, ldraw_lib__stud()],
// 1 16 -10 0 0 1 0 0 0 1 0 0 0 1 stud.dat
  [1,16,-10,0,0,1,0,0,0,1,0,0,0,1, ldraw_lib__stud()],
// 0
];
module ldraw_lib__4864a(step=0, col=false, unit=2/5, alt=false, line=0.2, solid=!$preview)
    makepoly(ldraw_lib__4864a(), step=step, col=col, unit=unit, alt=alt, line=line, solid=solid);
ldraw_lib__4864a(line=0.2);
